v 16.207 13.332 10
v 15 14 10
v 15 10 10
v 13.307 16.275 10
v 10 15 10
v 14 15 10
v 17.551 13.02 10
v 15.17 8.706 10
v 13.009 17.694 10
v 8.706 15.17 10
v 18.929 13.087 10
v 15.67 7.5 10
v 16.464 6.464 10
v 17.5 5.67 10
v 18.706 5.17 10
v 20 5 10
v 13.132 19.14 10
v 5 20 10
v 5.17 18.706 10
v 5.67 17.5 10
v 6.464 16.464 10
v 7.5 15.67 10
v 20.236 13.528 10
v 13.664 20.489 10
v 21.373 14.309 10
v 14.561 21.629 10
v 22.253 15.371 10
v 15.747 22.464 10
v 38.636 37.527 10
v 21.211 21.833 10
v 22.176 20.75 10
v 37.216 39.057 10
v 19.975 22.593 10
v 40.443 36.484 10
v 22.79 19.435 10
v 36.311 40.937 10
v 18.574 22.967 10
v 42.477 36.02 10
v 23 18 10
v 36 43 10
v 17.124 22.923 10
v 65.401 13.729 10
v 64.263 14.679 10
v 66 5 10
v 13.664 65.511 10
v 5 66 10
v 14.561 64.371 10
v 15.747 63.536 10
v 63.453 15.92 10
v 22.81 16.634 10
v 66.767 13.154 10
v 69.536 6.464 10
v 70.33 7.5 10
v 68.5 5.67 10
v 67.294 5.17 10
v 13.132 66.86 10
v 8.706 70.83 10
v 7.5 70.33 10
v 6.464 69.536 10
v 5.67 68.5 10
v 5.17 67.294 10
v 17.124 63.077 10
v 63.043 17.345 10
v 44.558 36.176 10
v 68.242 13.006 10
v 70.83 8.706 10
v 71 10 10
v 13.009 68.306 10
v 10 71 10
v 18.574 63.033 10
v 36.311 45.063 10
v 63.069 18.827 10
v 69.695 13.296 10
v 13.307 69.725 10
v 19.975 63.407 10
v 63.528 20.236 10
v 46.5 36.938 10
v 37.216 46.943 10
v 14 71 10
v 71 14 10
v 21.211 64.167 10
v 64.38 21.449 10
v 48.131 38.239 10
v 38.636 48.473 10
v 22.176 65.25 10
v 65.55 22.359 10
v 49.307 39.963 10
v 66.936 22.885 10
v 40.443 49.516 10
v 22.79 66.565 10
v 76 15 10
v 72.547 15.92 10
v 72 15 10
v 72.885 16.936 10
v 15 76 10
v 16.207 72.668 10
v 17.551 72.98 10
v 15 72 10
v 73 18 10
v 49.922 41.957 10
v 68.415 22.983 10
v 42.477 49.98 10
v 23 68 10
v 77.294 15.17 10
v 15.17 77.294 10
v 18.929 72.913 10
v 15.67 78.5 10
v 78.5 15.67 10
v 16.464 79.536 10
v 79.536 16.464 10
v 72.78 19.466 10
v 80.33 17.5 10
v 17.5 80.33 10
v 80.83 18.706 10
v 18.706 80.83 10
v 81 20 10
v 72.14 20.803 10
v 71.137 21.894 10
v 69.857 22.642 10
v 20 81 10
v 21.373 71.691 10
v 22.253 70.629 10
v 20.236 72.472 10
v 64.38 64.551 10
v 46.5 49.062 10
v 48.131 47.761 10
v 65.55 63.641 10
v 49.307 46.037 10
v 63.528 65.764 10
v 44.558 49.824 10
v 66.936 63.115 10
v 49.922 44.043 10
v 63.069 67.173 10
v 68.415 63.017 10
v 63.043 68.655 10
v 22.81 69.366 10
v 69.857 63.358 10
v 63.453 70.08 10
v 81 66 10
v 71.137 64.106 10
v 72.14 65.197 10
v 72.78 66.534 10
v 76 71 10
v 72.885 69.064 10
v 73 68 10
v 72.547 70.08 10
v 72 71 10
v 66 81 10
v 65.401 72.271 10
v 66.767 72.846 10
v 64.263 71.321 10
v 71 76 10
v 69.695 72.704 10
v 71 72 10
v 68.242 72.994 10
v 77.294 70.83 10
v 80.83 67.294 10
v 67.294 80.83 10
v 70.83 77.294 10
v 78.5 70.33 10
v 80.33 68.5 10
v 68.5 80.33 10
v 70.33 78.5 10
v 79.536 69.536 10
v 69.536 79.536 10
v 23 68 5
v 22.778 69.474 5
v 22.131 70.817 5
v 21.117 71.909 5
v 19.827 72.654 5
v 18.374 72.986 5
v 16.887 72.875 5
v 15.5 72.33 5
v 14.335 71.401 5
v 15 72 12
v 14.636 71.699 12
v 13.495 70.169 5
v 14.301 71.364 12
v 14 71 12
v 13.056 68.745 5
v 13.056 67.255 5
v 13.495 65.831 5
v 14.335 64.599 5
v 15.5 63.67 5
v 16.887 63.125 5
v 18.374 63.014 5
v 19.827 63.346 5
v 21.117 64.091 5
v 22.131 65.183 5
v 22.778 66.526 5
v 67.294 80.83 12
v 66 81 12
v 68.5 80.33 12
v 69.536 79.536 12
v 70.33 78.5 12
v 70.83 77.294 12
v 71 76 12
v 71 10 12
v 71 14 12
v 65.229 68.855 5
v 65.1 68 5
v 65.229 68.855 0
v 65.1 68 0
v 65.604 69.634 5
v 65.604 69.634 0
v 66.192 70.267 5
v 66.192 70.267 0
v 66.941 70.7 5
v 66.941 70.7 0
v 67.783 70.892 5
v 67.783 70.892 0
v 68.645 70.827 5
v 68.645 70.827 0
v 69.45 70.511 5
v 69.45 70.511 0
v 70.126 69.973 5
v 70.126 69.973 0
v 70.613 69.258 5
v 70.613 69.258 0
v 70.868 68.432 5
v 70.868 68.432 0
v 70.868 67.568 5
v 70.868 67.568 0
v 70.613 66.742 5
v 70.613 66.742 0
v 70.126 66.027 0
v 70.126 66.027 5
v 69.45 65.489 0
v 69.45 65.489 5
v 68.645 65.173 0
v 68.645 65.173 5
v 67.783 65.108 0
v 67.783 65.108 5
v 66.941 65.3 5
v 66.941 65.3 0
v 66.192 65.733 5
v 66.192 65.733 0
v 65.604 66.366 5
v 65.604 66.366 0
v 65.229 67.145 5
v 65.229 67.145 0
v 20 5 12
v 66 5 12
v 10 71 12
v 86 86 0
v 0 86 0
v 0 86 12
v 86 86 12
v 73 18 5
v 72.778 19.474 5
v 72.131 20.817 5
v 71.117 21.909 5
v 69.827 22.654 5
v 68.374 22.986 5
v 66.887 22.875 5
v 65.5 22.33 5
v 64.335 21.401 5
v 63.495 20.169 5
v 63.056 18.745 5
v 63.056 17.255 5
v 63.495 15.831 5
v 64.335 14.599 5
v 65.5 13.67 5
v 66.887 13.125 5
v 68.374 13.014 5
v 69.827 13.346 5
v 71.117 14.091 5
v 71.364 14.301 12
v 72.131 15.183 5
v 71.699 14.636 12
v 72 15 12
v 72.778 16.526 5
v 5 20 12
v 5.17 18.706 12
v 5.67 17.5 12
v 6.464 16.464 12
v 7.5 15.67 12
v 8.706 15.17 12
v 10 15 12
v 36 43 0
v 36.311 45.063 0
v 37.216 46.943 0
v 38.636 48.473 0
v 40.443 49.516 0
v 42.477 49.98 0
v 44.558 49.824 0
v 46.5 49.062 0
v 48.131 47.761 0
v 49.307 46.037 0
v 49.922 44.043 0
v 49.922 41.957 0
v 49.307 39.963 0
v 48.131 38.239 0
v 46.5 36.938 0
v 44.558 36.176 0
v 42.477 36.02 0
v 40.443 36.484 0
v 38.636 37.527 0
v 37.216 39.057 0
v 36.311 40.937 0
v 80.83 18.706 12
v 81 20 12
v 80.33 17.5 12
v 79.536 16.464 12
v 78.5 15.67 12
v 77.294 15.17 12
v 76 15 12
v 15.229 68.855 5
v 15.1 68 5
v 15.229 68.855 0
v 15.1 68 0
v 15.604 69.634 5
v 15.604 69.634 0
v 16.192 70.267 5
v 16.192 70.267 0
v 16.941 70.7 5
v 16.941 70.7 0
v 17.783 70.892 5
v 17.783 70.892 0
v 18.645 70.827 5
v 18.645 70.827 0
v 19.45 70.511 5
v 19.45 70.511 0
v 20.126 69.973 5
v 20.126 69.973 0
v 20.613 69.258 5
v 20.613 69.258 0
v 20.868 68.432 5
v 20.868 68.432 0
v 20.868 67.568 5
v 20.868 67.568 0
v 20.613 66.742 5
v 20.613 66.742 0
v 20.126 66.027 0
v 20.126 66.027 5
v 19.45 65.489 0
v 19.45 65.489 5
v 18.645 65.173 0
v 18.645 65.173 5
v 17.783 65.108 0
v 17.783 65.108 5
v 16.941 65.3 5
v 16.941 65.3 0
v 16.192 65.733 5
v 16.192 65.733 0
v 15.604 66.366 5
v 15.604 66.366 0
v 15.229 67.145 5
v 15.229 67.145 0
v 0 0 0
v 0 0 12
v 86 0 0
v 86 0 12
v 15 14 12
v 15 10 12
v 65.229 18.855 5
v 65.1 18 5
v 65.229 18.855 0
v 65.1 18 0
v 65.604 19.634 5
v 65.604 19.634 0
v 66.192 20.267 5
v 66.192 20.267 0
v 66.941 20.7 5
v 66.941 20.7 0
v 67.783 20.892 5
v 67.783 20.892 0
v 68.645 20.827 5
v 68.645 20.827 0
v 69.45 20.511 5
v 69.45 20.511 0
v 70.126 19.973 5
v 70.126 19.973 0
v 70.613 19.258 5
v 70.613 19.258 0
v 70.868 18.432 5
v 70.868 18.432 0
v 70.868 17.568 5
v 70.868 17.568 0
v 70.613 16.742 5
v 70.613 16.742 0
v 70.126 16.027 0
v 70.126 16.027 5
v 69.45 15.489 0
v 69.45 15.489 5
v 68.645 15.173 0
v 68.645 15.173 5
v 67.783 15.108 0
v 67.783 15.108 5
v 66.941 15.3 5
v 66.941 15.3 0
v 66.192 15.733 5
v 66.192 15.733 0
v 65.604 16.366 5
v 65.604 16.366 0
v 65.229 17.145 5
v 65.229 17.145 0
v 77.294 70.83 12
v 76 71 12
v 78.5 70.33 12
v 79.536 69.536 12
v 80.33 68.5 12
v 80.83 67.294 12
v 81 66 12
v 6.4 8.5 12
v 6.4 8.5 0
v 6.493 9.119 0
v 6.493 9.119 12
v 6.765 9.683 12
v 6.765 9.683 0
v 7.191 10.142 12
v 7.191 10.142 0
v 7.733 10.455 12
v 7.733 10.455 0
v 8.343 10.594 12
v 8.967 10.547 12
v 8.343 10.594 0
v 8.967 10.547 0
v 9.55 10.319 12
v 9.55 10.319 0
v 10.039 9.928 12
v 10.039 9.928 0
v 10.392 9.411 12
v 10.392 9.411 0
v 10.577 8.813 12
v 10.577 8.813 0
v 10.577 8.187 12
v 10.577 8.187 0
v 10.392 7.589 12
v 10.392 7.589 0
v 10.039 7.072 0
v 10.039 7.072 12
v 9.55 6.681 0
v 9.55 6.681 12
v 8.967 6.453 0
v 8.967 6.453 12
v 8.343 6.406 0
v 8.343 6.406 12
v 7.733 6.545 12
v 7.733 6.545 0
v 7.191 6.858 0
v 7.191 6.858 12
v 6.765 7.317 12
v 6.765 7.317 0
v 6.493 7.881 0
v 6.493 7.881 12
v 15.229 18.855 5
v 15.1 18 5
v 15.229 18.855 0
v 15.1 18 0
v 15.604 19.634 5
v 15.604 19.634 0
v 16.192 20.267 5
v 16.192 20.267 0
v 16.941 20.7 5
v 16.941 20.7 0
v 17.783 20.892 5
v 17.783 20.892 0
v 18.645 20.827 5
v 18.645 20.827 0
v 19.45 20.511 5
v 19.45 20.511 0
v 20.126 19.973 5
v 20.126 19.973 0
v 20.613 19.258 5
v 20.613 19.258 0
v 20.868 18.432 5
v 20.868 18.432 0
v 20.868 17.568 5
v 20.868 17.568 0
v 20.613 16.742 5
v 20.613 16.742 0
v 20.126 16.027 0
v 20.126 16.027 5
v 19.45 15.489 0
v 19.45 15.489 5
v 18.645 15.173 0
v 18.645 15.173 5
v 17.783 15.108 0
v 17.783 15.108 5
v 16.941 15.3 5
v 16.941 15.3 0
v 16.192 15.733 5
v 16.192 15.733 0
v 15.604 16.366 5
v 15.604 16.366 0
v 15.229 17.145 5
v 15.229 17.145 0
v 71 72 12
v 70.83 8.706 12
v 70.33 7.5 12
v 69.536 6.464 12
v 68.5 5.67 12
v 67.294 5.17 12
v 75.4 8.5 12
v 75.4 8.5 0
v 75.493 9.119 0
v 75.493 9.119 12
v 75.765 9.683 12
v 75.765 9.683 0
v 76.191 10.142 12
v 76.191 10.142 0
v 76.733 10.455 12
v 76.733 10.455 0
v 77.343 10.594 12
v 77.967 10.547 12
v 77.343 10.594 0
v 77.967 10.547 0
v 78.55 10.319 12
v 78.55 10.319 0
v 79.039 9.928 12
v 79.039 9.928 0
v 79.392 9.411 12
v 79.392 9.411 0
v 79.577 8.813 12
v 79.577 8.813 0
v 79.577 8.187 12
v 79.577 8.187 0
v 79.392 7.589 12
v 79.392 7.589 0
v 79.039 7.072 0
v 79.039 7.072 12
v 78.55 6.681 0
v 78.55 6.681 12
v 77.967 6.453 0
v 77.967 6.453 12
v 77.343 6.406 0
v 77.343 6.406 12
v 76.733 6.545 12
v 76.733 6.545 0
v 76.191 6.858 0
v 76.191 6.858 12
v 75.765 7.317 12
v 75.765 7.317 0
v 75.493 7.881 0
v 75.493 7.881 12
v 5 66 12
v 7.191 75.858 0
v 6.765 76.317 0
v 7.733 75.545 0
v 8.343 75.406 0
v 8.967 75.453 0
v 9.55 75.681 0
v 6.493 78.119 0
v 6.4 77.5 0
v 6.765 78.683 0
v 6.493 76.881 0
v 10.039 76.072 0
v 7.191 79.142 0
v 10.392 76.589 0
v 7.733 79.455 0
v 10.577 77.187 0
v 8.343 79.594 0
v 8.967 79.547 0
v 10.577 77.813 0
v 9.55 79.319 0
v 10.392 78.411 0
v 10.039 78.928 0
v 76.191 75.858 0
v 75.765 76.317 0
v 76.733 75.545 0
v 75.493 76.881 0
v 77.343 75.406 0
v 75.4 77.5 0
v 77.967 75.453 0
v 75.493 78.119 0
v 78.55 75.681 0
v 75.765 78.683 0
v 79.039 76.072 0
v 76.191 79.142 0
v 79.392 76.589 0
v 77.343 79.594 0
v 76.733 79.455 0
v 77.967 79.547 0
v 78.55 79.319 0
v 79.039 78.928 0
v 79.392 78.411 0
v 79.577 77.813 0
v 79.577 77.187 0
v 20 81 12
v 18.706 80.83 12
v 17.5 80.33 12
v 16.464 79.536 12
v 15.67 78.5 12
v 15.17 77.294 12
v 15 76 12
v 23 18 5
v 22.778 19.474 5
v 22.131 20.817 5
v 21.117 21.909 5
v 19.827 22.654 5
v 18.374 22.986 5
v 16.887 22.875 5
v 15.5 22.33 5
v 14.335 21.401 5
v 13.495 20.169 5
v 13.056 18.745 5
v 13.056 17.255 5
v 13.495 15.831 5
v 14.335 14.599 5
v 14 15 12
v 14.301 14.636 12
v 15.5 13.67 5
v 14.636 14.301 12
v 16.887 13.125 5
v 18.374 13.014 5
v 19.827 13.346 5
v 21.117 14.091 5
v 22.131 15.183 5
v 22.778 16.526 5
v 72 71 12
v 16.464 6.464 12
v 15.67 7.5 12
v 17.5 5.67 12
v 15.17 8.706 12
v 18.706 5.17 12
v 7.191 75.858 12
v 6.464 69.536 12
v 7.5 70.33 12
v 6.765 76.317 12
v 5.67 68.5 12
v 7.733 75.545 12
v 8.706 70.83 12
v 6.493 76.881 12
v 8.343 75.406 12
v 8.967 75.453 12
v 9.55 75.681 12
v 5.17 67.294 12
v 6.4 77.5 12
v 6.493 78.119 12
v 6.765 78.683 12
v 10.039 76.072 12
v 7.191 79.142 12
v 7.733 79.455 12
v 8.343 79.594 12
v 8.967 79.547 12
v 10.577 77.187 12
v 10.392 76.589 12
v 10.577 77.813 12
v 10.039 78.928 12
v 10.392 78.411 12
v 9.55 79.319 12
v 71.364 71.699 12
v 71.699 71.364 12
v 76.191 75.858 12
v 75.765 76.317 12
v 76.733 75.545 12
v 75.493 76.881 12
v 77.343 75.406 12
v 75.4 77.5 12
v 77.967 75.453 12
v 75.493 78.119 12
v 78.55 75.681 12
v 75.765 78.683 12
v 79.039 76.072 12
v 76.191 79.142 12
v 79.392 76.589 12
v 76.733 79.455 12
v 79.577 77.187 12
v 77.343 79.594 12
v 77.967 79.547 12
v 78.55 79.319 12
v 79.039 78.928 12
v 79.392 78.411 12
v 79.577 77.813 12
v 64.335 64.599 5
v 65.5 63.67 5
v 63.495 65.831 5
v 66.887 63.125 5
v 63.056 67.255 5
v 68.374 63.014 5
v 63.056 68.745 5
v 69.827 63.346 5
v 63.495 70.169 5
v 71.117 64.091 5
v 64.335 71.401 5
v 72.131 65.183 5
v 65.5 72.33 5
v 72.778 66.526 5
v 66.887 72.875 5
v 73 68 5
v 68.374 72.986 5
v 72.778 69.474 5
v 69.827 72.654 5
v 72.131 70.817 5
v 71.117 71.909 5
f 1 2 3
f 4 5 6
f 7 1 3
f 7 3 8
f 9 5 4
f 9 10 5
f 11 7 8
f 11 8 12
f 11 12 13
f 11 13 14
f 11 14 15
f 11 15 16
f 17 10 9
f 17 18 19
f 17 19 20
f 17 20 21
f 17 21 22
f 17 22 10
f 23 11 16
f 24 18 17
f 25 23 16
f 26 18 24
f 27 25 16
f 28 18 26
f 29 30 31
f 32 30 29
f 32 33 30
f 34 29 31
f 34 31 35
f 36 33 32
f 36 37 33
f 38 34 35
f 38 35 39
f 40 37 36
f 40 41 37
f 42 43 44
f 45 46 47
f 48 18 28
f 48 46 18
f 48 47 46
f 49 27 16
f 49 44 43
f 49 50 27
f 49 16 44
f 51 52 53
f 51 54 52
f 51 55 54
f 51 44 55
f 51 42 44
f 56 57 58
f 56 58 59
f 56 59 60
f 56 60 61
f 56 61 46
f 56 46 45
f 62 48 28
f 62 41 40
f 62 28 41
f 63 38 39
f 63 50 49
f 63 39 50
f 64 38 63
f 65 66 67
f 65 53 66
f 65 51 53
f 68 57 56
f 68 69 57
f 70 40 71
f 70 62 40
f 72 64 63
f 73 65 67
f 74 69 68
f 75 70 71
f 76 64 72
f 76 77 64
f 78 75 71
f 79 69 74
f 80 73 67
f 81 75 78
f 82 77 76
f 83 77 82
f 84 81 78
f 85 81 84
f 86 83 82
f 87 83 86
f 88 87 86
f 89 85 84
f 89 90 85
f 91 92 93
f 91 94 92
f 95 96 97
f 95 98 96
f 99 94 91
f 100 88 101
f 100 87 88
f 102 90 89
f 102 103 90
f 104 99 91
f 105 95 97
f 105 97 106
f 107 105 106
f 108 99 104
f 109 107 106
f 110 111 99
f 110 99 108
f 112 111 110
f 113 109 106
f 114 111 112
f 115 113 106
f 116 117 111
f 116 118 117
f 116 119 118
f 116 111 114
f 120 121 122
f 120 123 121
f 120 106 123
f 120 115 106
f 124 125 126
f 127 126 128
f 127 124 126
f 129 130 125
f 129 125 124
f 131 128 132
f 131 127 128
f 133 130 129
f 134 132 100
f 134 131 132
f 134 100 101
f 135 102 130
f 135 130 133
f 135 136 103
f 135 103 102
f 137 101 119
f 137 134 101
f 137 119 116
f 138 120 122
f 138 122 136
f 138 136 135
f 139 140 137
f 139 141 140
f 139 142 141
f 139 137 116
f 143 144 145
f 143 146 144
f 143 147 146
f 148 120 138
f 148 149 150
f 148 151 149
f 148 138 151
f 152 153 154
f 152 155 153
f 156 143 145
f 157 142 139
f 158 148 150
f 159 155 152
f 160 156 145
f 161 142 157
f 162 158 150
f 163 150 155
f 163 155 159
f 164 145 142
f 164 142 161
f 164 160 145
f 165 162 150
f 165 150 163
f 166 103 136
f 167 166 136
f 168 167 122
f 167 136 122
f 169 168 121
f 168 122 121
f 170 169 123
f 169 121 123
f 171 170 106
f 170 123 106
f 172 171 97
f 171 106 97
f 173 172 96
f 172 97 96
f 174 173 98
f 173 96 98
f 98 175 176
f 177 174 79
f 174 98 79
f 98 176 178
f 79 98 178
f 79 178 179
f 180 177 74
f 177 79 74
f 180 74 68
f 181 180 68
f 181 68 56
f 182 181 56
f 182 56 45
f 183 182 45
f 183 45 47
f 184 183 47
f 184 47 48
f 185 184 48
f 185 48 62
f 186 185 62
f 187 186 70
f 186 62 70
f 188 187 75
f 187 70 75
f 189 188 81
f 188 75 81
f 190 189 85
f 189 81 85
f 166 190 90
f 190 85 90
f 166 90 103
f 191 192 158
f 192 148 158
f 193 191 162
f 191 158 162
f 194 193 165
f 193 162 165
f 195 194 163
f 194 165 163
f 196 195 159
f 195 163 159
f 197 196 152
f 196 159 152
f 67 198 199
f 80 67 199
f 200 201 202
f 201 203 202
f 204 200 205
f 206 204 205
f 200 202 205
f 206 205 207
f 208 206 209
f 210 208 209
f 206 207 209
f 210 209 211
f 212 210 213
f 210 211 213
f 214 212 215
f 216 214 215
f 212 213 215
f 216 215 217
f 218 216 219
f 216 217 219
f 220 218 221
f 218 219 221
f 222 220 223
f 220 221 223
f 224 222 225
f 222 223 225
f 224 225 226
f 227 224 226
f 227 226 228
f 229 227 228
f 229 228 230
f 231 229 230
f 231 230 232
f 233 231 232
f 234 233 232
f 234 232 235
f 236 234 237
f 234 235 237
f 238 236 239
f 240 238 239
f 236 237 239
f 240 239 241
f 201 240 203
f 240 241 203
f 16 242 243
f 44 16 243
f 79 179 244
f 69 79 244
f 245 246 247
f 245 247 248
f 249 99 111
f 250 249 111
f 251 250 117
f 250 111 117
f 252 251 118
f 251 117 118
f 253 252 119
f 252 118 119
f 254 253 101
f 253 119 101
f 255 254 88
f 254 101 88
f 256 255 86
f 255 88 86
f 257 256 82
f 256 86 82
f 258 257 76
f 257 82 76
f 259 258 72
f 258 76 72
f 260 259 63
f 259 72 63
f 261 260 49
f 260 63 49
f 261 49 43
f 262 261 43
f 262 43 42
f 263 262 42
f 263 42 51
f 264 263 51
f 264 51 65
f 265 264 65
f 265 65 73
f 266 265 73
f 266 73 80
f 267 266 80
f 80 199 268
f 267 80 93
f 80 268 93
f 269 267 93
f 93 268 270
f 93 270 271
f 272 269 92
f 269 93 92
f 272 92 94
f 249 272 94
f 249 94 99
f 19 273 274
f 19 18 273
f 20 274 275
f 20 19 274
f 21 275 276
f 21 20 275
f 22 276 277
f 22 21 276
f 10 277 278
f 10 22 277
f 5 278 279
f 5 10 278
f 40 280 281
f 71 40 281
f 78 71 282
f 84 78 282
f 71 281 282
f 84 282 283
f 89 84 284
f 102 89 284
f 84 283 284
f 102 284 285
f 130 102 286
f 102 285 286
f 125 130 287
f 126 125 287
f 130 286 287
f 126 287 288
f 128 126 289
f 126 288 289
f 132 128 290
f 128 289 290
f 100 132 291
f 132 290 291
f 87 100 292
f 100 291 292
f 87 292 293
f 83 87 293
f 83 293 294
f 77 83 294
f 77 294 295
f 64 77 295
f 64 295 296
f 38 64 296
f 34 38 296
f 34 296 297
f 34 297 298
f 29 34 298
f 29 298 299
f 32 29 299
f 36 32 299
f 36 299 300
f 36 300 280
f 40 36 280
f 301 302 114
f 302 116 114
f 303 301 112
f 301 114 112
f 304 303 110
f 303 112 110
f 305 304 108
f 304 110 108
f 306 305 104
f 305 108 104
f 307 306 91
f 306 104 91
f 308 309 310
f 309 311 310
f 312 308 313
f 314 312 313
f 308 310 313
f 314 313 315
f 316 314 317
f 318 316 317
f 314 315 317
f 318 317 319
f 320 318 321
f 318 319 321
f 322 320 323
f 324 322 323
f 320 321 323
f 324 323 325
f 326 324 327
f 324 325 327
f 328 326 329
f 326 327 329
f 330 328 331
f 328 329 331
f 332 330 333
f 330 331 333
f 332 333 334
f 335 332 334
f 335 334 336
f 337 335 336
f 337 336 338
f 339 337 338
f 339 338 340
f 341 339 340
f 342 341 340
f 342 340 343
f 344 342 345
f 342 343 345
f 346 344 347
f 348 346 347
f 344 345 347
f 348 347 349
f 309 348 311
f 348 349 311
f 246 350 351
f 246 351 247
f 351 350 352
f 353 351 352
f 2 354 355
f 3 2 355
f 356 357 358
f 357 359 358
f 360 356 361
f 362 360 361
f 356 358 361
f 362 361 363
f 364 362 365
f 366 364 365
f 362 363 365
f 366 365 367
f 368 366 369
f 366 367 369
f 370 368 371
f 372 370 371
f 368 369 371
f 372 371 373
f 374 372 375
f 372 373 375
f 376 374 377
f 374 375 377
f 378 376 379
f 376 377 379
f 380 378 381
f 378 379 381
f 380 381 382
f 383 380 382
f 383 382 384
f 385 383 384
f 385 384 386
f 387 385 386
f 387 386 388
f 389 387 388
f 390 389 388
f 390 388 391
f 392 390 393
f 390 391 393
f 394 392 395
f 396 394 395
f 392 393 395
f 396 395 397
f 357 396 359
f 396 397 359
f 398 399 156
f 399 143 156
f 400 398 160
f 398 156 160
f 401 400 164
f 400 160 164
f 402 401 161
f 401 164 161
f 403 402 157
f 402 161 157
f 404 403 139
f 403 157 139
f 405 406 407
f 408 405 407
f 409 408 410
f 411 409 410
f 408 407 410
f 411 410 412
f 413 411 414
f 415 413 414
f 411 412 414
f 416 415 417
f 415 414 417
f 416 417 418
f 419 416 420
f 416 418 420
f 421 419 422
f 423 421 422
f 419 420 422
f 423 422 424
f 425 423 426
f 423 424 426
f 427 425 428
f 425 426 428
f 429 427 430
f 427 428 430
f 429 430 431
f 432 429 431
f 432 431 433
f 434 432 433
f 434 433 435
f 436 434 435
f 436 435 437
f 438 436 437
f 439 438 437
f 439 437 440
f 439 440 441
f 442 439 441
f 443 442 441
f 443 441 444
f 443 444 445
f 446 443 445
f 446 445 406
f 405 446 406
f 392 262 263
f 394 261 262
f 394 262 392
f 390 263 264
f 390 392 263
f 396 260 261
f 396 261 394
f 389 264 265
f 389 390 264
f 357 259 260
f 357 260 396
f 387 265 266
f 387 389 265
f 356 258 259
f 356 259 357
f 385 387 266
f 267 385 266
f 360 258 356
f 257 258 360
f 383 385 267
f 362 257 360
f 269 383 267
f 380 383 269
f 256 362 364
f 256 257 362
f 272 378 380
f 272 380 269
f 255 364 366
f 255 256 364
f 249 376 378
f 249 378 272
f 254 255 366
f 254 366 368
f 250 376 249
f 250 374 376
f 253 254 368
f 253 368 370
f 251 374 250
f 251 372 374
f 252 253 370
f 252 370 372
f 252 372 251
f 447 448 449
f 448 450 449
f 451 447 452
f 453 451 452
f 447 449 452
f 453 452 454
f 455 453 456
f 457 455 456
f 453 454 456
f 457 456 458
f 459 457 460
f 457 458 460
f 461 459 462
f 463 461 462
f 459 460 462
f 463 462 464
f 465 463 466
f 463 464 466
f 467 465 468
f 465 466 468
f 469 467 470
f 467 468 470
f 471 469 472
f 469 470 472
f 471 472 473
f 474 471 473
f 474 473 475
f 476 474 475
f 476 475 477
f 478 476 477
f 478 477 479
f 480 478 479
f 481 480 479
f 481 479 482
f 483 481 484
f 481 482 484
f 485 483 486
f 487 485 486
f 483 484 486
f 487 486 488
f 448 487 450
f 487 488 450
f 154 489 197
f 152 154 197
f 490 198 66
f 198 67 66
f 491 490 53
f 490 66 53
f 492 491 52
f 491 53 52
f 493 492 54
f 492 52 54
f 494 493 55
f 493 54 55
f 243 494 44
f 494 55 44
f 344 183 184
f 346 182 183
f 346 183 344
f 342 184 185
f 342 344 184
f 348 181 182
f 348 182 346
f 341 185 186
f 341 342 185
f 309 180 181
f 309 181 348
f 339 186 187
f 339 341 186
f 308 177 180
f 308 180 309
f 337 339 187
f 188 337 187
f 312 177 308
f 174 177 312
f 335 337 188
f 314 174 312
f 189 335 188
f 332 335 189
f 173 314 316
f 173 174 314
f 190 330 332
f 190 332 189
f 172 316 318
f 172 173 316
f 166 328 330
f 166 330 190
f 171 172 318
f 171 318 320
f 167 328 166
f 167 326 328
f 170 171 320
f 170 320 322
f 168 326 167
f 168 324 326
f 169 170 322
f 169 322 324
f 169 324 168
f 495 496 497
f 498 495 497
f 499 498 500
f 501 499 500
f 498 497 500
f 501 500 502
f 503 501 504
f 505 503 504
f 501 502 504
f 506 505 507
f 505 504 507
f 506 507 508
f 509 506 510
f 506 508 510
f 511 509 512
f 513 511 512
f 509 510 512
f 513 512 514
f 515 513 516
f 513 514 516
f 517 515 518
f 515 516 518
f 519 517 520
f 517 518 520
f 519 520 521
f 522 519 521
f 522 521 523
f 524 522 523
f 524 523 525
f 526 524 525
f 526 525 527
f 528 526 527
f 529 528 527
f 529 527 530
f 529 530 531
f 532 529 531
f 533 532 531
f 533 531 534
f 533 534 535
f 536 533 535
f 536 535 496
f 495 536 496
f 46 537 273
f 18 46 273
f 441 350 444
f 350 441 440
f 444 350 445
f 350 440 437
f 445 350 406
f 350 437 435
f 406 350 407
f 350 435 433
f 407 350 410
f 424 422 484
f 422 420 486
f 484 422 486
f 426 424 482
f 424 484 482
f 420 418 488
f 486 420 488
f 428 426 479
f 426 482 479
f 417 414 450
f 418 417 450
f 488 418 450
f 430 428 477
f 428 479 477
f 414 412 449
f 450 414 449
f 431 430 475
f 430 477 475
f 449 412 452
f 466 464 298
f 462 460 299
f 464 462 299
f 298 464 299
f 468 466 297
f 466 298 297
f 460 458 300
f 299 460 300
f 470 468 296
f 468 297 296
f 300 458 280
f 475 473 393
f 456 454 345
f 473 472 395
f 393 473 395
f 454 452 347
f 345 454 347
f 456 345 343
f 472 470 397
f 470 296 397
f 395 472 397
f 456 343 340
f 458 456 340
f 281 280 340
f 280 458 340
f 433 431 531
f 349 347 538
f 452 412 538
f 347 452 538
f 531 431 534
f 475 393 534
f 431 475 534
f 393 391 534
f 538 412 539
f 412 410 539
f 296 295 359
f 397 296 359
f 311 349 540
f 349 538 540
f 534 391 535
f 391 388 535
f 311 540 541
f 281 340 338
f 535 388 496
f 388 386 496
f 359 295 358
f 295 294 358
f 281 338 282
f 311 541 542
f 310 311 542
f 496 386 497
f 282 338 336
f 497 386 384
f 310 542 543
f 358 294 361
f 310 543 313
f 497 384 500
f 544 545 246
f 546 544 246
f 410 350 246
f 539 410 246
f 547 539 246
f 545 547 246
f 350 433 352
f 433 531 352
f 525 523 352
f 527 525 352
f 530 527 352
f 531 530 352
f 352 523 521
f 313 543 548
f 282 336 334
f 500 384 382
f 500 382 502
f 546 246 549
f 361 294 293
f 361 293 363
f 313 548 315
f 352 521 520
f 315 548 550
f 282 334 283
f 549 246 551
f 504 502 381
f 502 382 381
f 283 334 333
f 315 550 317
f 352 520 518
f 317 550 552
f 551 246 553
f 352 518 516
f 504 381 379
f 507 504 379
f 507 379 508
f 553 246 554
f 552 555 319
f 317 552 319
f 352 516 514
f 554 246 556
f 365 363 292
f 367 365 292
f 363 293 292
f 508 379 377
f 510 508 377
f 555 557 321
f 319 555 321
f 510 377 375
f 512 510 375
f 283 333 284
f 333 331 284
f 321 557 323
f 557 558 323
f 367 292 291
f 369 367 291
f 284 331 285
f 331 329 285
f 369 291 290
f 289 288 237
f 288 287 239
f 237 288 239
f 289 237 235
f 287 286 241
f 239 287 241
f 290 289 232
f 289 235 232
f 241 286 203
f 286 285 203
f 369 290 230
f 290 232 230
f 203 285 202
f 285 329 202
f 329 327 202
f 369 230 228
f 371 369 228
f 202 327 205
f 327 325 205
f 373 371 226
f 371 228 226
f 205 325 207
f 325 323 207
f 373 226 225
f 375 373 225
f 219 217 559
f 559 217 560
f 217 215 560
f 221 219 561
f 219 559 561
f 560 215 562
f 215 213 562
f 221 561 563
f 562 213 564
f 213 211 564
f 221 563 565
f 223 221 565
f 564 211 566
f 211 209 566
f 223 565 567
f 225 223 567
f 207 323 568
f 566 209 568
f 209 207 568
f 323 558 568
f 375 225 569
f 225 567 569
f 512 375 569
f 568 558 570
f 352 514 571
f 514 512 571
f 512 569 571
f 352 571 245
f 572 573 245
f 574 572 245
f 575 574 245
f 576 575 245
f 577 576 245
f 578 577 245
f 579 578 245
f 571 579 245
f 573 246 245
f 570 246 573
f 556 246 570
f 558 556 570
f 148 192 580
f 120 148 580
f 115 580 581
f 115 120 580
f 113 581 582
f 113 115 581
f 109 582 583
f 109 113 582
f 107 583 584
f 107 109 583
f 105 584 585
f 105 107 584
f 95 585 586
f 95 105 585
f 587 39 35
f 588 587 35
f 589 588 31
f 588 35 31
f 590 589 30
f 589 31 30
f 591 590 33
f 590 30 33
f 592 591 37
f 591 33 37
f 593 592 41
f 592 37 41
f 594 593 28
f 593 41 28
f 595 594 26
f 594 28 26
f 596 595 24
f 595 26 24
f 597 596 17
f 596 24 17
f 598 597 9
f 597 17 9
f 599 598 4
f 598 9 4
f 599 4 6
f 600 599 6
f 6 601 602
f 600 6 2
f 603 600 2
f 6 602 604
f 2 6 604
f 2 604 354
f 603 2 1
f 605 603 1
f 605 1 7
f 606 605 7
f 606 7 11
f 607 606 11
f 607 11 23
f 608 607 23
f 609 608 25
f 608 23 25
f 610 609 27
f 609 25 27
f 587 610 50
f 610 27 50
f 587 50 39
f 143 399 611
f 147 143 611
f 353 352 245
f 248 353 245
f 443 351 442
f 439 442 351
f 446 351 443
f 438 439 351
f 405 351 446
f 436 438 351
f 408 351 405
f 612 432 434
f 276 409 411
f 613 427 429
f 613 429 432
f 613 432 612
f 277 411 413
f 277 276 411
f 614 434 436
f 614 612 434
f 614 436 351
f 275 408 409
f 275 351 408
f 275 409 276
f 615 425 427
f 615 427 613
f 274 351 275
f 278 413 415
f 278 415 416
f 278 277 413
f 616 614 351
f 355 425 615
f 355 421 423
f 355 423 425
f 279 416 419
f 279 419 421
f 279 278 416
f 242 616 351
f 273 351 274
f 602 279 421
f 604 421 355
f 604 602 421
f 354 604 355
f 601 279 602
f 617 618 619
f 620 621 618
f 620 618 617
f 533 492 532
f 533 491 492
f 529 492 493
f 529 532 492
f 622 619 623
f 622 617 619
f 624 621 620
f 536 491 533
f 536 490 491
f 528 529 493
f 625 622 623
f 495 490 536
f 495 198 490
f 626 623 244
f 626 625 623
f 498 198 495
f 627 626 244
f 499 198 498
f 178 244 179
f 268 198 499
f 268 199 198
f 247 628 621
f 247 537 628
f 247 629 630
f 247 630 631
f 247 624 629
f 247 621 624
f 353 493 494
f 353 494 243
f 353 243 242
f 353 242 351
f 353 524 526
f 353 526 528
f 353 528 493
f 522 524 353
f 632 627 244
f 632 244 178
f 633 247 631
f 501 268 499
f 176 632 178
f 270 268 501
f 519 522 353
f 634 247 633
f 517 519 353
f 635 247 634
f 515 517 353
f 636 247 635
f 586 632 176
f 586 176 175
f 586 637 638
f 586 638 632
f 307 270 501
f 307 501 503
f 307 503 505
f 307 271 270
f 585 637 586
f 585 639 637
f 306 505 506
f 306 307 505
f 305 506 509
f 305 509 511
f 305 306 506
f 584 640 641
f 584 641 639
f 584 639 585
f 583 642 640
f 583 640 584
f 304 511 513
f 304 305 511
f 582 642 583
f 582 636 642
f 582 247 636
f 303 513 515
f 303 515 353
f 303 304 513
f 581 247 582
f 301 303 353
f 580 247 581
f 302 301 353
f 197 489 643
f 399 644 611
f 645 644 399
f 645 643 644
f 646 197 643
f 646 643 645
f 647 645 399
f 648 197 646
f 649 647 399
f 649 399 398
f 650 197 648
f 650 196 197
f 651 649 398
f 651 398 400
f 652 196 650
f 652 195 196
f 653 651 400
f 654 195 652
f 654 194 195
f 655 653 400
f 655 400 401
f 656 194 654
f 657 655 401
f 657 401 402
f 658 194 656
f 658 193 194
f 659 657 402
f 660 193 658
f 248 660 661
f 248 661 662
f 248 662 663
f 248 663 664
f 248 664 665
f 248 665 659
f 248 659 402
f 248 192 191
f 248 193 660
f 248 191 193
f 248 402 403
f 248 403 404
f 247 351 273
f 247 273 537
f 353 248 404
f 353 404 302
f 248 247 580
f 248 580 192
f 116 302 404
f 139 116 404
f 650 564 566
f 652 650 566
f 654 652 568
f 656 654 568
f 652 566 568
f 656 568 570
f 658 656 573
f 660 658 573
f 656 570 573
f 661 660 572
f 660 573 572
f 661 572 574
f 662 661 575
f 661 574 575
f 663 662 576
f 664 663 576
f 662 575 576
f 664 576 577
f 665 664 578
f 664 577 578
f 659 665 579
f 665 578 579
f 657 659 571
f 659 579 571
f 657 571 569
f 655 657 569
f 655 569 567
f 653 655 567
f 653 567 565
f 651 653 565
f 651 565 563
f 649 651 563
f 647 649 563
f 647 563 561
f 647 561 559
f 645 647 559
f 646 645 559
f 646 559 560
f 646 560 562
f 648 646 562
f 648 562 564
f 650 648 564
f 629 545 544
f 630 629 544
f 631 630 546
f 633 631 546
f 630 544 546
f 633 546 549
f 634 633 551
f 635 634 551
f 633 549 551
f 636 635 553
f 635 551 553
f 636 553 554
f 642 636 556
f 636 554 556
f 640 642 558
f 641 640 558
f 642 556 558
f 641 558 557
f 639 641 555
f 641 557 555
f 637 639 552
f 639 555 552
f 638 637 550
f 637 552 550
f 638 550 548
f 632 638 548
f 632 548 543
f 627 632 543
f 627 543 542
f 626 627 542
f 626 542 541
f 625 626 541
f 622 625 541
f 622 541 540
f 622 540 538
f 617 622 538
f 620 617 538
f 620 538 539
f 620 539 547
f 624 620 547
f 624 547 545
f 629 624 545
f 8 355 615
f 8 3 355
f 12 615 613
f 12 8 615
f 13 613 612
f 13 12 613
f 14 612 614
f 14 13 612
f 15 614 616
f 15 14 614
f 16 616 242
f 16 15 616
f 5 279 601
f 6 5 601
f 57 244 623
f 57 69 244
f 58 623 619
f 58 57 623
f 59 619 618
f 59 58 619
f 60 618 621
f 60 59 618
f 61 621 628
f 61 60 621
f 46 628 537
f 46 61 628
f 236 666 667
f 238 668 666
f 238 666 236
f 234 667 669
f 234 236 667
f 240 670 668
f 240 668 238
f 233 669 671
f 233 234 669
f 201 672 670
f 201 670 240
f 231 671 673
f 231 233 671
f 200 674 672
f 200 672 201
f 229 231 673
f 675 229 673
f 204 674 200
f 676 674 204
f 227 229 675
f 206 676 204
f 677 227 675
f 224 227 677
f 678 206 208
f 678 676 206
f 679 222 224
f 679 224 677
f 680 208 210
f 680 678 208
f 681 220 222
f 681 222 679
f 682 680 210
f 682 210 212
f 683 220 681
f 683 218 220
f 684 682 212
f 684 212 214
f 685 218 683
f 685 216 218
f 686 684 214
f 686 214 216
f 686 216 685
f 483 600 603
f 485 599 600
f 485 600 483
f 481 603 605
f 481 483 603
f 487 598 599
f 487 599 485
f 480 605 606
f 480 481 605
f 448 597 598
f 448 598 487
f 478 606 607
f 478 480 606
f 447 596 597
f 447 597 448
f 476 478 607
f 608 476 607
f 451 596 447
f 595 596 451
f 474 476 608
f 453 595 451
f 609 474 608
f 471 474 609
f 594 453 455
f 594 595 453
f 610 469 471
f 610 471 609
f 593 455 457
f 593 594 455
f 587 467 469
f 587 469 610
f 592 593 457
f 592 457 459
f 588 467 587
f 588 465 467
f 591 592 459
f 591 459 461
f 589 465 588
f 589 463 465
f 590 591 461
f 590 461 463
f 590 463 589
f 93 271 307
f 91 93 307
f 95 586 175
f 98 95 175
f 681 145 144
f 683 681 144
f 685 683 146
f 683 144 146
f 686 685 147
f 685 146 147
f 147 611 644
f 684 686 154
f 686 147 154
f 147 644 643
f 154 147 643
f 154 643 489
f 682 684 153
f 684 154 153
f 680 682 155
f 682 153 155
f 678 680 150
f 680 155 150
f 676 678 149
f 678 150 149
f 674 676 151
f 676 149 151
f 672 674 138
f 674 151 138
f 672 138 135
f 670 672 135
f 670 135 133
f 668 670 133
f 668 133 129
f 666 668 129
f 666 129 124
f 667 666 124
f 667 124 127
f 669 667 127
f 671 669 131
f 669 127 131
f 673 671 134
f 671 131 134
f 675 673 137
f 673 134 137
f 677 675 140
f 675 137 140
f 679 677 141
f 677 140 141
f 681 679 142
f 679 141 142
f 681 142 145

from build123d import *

# Parameters (mm, degrees)
SKETCH_1_W                     = 86
SKETCH_1_H                     = 86
EXTRUDE_1_DEPTH                = 12
CUT_EXTRUDE_1_DEPTH            = 2
SKETCH_3_R                     = 7
CUT_EXTRUDE_2_DEPTH            = 123.21292894
HOLE_WIZARD_M5_1_D             = 4.2
FILLET_1_R                     = 5
HOLE_WIZARD_M5_1_2_D           = 5.8
HOLE_WIZARD_M5_1_2_CBORE_D     = 10
HOLE_WIZARD_M5_1_2_CBORE_DEPTH = 7


with BuildPart() as part:
    # 草图1 → 凸台-拉伸1 (new body)
    with BuildSketch(Plane.XY):
        with Locations((43, 43)):
            Rectangle(SKETCH_1_W, SKETCH_1_H)
    extrude(amount=EXTRUDE_1_DEPTH)

    # 草图2 → 切除-拉伸1 (cut)
    with BuildSketch(Plane.XY.offset(12)):
        Polygon((71, 81), (15, 81), (15, 71), (5, 71), (5, 15), (15, 15), (15, 5), (71, 5), (71, 15), (81, 15), (81, 71), (71, 71), align=None)
    extrude(amount=-CUT_EXTRUDE_1_DEPTH, mode=Mode.SUBTRACT)

    # 草图3 → 切除-拉伸2 (cut, through all)
    with BuildSketch(Plane(origin=(0, 0, 0), x_dir=(-1, 0, 0), z_dir=(0, 0, -1))):
        with Locations((-43, 43)):
            Circle(SKETCH_3_R)
    extrude(amount=-CUT_EXTRUDE_2_DEPTH, mode=Mode.SUBTRACT)

    # Hole Wizard M5 _1 (through all)
    with Locations(Plane.XY.offset(12)):
        with Locations((77.5, 77.5), (8.5, 77.5), (8.5, 8.5), (77.5, 8.5)):
            Hole(HOLE_WIZARD_M5_1_D / 2)

    # 圆角1
    fillet_1_edges = [part.edges().sort_by_distance(p)[0] for p in [
        (15, 81, 11),
        (71, 81, 11),
        (81, 71, 11),
        (81, 15, 11),
        (71, 5, 11),
        (15, 5, 11),
        (5, 15, 11),
        (5, 71, 11),
    ]]
    fillet(fillet_1_edges, radius=FILLET_1_R)

    # Hole Wizard M5 _1 2 (through all)
    with Locations(Plane.XY.offset(12)):
        with Locations((18, 68), (68, 68), (18, 18), (68, 18)):
            CounterBoreHole(HOLE_WIZARD_M5_1_2_D / 2, HOLE_WIZARD_M5_1_2_CBORE_D / 2, HOLE_WIZARD_M5_1_2_CBORE_DEPTH)


solid = part.part
